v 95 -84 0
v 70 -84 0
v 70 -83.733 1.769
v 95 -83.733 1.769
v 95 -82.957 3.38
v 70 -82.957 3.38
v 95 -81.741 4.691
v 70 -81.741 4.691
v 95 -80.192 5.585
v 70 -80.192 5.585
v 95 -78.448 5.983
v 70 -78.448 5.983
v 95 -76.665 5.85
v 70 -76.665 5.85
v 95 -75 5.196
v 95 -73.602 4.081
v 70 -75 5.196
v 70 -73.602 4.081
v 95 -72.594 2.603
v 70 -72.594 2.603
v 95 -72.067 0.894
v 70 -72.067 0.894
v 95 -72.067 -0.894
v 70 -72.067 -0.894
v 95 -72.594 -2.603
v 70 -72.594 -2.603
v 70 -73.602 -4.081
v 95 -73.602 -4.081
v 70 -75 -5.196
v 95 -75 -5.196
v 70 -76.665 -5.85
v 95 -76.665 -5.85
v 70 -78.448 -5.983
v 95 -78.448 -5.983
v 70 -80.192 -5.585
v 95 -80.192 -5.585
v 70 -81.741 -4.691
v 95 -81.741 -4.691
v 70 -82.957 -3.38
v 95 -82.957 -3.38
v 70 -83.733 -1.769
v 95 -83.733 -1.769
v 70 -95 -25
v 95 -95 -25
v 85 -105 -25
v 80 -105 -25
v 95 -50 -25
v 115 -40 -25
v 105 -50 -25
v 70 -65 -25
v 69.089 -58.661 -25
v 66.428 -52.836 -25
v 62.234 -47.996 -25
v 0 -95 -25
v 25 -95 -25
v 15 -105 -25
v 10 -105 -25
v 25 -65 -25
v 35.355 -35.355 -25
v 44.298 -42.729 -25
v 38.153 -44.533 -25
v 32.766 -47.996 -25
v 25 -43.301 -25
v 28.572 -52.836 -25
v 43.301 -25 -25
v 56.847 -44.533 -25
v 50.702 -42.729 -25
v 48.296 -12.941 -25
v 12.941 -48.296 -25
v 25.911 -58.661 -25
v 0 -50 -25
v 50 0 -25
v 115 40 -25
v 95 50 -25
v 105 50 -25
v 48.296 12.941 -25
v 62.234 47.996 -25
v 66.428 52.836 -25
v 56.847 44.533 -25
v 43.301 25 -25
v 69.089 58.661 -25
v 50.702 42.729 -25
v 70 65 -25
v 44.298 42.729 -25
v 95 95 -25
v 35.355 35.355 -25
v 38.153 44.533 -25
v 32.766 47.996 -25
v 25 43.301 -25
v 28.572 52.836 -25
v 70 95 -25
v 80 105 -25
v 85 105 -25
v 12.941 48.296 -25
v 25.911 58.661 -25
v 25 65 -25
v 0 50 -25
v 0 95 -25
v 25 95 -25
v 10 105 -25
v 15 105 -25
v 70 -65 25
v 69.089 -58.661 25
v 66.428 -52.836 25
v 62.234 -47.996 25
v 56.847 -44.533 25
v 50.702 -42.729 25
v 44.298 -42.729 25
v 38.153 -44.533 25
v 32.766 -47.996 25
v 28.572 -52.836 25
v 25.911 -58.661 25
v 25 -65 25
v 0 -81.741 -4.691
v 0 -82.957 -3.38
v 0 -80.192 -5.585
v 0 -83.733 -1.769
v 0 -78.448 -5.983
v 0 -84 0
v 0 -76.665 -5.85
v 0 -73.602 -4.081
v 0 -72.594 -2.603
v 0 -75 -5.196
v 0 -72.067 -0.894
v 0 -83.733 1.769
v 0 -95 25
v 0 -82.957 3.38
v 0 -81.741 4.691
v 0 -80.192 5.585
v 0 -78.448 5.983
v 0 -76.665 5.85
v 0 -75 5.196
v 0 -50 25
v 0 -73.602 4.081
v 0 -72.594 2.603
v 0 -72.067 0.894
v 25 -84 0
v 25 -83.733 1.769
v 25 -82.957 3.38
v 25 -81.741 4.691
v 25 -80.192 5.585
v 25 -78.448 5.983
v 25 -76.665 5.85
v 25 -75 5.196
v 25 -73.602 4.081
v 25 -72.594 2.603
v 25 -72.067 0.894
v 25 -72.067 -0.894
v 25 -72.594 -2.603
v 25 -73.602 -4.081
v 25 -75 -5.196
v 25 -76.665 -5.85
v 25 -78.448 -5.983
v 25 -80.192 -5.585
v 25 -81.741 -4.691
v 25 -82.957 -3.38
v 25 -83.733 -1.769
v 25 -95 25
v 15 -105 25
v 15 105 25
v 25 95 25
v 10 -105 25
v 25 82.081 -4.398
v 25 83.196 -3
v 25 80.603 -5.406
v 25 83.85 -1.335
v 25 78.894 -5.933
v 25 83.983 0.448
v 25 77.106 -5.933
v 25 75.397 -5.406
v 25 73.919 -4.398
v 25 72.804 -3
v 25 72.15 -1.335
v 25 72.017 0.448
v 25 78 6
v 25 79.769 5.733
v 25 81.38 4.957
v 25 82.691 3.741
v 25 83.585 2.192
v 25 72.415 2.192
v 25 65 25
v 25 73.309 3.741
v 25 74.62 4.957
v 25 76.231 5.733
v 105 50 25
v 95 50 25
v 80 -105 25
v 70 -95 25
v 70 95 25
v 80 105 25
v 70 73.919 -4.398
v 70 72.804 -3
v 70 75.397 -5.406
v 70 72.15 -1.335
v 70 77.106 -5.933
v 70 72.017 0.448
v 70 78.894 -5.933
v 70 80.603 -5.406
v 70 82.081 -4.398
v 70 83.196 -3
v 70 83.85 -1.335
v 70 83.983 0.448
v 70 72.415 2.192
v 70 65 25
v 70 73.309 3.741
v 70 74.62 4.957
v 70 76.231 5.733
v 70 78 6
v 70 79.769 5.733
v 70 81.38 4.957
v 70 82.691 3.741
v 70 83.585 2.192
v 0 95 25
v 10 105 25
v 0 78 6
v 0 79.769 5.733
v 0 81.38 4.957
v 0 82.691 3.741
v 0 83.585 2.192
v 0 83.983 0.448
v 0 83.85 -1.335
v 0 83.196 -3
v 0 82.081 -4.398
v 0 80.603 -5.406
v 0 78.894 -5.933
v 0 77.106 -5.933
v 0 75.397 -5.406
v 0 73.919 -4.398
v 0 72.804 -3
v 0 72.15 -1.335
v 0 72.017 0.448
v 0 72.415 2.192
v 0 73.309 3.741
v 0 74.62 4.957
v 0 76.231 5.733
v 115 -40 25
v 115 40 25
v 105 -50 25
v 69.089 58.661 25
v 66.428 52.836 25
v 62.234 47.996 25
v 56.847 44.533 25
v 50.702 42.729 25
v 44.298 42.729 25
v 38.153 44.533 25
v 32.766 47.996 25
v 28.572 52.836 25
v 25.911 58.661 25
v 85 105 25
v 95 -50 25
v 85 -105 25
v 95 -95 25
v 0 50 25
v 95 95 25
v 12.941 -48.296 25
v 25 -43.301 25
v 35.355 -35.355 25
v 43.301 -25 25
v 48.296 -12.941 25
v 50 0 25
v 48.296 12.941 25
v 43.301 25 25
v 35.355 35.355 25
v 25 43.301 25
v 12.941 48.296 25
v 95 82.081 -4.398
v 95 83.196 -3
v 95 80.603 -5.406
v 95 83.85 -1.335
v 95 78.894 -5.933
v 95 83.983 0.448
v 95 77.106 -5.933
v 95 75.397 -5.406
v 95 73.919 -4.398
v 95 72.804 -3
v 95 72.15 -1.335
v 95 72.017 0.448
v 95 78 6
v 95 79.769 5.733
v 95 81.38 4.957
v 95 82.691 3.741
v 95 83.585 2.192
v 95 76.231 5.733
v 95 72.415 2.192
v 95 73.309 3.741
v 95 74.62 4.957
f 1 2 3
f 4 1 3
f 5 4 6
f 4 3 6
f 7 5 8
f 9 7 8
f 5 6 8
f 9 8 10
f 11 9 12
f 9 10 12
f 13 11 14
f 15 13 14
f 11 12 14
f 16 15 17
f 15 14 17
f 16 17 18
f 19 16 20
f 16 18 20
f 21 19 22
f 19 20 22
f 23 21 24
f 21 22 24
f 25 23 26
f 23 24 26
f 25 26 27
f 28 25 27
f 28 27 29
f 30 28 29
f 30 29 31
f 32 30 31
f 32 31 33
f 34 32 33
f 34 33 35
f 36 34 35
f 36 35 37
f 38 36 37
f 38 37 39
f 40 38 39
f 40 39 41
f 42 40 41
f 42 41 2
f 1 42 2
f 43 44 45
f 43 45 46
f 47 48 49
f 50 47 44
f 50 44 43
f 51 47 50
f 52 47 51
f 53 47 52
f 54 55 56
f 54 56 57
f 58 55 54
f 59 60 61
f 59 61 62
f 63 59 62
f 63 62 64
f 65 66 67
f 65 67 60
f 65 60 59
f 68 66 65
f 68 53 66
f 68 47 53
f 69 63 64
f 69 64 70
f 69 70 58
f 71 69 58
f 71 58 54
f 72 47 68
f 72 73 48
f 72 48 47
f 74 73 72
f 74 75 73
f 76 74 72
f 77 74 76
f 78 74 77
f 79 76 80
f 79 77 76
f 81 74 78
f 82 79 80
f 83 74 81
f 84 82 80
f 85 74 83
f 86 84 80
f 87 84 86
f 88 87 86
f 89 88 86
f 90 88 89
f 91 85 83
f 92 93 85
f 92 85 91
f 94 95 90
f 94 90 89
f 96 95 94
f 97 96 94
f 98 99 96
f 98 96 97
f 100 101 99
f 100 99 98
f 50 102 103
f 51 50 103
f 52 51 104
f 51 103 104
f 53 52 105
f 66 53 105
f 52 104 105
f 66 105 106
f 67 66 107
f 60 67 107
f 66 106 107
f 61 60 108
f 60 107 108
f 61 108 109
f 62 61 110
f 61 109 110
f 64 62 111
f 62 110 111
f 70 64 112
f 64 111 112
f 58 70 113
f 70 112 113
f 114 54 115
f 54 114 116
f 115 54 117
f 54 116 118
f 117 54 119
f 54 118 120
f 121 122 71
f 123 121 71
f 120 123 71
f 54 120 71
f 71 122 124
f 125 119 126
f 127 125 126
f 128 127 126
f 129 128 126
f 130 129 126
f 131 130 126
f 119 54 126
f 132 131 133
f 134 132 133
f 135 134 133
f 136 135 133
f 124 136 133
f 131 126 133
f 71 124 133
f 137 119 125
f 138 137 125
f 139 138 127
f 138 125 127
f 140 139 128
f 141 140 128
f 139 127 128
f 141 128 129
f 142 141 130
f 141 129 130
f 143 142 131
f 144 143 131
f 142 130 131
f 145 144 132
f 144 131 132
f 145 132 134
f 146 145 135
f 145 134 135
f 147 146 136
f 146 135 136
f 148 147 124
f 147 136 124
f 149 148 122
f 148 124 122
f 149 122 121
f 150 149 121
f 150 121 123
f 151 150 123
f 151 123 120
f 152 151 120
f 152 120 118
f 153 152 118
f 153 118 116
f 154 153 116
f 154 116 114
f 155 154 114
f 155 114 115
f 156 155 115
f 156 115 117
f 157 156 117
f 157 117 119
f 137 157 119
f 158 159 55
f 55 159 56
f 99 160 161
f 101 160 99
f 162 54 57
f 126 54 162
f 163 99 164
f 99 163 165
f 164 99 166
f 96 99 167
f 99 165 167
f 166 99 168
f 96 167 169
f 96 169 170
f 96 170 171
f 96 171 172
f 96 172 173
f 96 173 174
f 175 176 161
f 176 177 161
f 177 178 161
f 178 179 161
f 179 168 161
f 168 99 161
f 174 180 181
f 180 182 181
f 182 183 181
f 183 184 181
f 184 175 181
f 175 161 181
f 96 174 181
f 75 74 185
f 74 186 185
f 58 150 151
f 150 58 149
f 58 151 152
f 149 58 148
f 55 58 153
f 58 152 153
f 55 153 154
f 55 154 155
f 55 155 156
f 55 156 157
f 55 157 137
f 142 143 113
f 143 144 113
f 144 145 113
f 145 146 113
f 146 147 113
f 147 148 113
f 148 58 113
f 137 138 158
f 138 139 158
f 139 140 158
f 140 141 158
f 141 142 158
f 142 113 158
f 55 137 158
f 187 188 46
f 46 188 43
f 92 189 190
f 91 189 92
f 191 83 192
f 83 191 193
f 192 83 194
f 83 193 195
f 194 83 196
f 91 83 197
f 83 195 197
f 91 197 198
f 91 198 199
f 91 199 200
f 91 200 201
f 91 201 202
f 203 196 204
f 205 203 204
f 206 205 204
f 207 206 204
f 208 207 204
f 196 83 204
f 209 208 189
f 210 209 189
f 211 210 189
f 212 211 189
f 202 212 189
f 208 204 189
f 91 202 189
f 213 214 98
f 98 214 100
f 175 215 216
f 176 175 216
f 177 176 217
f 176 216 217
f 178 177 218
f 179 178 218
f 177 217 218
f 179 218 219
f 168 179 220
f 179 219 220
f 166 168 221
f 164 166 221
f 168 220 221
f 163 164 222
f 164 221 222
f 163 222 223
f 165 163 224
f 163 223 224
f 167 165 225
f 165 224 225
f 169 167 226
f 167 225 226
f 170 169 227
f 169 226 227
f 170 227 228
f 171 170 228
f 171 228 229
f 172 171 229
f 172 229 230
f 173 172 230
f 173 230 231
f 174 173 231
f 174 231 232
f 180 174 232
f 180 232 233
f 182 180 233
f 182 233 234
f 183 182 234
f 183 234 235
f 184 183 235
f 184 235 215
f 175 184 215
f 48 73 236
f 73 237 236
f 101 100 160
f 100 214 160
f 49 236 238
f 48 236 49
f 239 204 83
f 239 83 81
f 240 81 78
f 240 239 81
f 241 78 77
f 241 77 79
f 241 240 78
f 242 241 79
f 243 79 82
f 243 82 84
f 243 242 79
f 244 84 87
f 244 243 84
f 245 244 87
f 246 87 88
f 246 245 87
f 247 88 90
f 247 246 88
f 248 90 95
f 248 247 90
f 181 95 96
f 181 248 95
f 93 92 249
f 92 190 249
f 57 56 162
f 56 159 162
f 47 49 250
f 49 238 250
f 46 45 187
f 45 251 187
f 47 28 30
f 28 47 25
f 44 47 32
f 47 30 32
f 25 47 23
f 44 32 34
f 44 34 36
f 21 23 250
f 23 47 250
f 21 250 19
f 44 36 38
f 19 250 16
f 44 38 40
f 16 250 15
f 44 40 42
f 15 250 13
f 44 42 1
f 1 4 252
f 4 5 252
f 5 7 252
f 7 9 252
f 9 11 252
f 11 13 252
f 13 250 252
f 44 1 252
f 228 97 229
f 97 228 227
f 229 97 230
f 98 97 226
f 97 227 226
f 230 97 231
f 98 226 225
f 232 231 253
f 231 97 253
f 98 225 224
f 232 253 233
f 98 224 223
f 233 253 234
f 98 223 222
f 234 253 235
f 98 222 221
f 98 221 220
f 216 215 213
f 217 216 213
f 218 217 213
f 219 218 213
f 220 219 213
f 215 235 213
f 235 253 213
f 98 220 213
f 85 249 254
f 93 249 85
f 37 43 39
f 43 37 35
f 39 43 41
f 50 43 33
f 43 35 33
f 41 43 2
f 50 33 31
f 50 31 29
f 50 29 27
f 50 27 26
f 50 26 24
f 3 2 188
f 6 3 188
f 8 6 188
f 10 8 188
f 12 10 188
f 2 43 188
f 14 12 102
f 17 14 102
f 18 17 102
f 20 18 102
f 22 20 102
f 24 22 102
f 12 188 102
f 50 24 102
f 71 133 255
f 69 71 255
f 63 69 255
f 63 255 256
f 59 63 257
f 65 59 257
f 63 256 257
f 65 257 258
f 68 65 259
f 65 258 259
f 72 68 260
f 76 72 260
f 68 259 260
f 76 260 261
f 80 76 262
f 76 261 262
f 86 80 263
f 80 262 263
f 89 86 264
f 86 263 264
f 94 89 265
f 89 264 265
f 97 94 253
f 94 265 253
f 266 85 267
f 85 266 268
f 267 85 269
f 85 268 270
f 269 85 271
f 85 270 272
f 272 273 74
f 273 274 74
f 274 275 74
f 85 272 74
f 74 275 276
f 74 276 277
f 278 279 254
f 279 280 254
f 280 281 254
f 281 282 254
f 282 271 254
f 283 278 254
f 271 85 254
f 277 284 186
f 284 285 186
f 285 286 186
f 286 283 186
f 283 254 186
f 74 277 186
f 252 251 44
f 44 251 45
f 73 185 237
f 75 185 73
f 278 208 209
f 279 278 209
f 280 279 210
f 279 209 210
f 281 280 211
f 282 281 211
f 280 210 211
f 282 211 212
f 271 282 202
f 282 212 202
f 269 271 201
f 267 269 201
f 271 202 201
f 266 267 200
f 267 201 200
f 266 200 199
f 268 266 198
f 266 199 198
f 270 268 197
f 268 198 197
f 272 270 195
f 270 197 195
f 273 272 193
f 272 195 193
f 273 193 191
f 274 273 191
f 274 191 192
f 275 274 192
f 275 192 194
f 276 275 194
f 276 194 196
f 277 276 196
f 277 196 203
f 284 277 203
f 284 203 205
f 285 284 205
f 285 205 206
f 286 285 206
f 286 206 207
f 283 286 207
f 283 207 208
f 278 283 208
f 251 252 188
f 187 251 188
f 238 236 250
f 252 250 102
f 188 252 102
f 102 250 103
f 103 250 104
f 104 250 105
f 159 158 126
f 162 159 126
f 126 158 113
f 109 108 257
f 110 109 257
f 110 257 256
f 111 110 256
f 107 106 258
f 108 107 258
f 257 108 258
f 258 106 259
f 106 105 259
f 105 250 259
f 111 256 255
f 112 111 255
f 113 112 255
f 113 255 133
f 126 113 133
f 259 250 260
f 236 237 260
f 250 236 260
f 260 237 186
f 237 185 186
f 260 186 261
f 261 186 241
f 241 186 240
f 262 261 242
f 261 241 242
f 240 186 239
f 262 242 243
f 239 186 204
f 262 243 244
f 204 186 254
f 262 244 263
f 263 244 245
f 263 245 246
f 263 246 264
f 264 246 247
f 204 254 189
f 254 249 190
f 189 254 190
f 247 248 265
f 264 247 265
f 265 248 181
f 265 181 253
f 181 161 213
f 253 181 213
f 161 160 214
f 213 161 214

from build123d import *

# Parameters (mm, degrees)
BOSS_EXTRUDE1_DEPTH = 25
CUT_EXTRUDE1_DEPTH  = 50
SKETCH4_R           = 6
CUT_EXTRUDE2_DEPTH  = 200
CHAMFER1_SIZE       = 10
CHAMFER2_SIZE       = 10


with BuildPart() as part:
    # Sketch1 → Boss-Extrude1 (new, symmetric)
    with BuildSketch(Plane.XY):
        with BuildLine():
            Line((0, 50), (0, 105))
            Line((0, 105), (25, 105))
            Line((25, 105), (25, 65))
            Line((25, 65), (70, 65))
            Line((70, 65), (70, 105))
            Line((70, 105), (95, 105))
            Line((95, 105), (95, 50))
            Line((95, 50), (115, 50))
            Line((115, 50), (115, -50))
            Line((115, -50), (95, -50))
            Line((95, -50), (95, -105))
            Line((95, -105), (70, -105))
            Line((70, -105), (70, -65))
            Line((70, -65), (25, -65))
            Line((25, -65), (25, -105))
            Line((25, -105), (0, -105))
            Line((0, -105), (0, -50))
            ThreePointArc((0, -50), (50, 0), (0, 50))
        make_face()
    extrude(amount=BOSS_EXTRUDE1_DEPTH, both=True)

    # Sketch3 → Cut-Extrude1 (cut)
    with BuildSketch(Plane.XY.offset(25)):
        with BuildLine():
            Line((25, 65), (70, 65))
            ThreePointArc((70, 65), (47.5, 42.5), (25, 65))
        make_face()
        with BuildLine():
            Line((25, -65), (70, -65))
            ThreePointArc((70, -65), (47.5, -42.5), (25, -65))
        make_face()
    extrude(amount=-CUT_EXTRUDE1_DEPTH, mode=Mode.SUBTRACT)

    # Sketch4 → Cut-Extrude2 (cut)
    with BuildSketch(Plane.ZY):
        with Locations((0, 78)):
            Circle(SKETCH4_R)
        with Locations(Location((0, -78, 0), (0, 0, 270))):
            Circle(SKETCH4_R)
    extrude(amount=-CUT_EXTRUDE2_DEPTH, mode=Mode.SUBTRACT)

    # Chamfer1
    chamfer1_edges = [part.edges().sort_by_distance(p)[0] for p in [
        (115, 50, 0),
        (115, -50, 0),
    ]]
    chamfer(chamfer1_edges, length=CHAMFER1_SIZE)

    # Chamfer2
    chamfer2_edges = [part.edges().sort_by_distance(p)[0] for p in [
        (0, 105, 0),
        (25, 105, 0),
        (70, 105, 0),
        (95, 105, 0),
        (95, -105, 0),
        (70, -105, 0),
        (25, -105, 0),
        (0, -105, 0),
    ]]
    chamfer(chamfer2_edges, length=CHAMFER2_SIZE)


solid = part.part
